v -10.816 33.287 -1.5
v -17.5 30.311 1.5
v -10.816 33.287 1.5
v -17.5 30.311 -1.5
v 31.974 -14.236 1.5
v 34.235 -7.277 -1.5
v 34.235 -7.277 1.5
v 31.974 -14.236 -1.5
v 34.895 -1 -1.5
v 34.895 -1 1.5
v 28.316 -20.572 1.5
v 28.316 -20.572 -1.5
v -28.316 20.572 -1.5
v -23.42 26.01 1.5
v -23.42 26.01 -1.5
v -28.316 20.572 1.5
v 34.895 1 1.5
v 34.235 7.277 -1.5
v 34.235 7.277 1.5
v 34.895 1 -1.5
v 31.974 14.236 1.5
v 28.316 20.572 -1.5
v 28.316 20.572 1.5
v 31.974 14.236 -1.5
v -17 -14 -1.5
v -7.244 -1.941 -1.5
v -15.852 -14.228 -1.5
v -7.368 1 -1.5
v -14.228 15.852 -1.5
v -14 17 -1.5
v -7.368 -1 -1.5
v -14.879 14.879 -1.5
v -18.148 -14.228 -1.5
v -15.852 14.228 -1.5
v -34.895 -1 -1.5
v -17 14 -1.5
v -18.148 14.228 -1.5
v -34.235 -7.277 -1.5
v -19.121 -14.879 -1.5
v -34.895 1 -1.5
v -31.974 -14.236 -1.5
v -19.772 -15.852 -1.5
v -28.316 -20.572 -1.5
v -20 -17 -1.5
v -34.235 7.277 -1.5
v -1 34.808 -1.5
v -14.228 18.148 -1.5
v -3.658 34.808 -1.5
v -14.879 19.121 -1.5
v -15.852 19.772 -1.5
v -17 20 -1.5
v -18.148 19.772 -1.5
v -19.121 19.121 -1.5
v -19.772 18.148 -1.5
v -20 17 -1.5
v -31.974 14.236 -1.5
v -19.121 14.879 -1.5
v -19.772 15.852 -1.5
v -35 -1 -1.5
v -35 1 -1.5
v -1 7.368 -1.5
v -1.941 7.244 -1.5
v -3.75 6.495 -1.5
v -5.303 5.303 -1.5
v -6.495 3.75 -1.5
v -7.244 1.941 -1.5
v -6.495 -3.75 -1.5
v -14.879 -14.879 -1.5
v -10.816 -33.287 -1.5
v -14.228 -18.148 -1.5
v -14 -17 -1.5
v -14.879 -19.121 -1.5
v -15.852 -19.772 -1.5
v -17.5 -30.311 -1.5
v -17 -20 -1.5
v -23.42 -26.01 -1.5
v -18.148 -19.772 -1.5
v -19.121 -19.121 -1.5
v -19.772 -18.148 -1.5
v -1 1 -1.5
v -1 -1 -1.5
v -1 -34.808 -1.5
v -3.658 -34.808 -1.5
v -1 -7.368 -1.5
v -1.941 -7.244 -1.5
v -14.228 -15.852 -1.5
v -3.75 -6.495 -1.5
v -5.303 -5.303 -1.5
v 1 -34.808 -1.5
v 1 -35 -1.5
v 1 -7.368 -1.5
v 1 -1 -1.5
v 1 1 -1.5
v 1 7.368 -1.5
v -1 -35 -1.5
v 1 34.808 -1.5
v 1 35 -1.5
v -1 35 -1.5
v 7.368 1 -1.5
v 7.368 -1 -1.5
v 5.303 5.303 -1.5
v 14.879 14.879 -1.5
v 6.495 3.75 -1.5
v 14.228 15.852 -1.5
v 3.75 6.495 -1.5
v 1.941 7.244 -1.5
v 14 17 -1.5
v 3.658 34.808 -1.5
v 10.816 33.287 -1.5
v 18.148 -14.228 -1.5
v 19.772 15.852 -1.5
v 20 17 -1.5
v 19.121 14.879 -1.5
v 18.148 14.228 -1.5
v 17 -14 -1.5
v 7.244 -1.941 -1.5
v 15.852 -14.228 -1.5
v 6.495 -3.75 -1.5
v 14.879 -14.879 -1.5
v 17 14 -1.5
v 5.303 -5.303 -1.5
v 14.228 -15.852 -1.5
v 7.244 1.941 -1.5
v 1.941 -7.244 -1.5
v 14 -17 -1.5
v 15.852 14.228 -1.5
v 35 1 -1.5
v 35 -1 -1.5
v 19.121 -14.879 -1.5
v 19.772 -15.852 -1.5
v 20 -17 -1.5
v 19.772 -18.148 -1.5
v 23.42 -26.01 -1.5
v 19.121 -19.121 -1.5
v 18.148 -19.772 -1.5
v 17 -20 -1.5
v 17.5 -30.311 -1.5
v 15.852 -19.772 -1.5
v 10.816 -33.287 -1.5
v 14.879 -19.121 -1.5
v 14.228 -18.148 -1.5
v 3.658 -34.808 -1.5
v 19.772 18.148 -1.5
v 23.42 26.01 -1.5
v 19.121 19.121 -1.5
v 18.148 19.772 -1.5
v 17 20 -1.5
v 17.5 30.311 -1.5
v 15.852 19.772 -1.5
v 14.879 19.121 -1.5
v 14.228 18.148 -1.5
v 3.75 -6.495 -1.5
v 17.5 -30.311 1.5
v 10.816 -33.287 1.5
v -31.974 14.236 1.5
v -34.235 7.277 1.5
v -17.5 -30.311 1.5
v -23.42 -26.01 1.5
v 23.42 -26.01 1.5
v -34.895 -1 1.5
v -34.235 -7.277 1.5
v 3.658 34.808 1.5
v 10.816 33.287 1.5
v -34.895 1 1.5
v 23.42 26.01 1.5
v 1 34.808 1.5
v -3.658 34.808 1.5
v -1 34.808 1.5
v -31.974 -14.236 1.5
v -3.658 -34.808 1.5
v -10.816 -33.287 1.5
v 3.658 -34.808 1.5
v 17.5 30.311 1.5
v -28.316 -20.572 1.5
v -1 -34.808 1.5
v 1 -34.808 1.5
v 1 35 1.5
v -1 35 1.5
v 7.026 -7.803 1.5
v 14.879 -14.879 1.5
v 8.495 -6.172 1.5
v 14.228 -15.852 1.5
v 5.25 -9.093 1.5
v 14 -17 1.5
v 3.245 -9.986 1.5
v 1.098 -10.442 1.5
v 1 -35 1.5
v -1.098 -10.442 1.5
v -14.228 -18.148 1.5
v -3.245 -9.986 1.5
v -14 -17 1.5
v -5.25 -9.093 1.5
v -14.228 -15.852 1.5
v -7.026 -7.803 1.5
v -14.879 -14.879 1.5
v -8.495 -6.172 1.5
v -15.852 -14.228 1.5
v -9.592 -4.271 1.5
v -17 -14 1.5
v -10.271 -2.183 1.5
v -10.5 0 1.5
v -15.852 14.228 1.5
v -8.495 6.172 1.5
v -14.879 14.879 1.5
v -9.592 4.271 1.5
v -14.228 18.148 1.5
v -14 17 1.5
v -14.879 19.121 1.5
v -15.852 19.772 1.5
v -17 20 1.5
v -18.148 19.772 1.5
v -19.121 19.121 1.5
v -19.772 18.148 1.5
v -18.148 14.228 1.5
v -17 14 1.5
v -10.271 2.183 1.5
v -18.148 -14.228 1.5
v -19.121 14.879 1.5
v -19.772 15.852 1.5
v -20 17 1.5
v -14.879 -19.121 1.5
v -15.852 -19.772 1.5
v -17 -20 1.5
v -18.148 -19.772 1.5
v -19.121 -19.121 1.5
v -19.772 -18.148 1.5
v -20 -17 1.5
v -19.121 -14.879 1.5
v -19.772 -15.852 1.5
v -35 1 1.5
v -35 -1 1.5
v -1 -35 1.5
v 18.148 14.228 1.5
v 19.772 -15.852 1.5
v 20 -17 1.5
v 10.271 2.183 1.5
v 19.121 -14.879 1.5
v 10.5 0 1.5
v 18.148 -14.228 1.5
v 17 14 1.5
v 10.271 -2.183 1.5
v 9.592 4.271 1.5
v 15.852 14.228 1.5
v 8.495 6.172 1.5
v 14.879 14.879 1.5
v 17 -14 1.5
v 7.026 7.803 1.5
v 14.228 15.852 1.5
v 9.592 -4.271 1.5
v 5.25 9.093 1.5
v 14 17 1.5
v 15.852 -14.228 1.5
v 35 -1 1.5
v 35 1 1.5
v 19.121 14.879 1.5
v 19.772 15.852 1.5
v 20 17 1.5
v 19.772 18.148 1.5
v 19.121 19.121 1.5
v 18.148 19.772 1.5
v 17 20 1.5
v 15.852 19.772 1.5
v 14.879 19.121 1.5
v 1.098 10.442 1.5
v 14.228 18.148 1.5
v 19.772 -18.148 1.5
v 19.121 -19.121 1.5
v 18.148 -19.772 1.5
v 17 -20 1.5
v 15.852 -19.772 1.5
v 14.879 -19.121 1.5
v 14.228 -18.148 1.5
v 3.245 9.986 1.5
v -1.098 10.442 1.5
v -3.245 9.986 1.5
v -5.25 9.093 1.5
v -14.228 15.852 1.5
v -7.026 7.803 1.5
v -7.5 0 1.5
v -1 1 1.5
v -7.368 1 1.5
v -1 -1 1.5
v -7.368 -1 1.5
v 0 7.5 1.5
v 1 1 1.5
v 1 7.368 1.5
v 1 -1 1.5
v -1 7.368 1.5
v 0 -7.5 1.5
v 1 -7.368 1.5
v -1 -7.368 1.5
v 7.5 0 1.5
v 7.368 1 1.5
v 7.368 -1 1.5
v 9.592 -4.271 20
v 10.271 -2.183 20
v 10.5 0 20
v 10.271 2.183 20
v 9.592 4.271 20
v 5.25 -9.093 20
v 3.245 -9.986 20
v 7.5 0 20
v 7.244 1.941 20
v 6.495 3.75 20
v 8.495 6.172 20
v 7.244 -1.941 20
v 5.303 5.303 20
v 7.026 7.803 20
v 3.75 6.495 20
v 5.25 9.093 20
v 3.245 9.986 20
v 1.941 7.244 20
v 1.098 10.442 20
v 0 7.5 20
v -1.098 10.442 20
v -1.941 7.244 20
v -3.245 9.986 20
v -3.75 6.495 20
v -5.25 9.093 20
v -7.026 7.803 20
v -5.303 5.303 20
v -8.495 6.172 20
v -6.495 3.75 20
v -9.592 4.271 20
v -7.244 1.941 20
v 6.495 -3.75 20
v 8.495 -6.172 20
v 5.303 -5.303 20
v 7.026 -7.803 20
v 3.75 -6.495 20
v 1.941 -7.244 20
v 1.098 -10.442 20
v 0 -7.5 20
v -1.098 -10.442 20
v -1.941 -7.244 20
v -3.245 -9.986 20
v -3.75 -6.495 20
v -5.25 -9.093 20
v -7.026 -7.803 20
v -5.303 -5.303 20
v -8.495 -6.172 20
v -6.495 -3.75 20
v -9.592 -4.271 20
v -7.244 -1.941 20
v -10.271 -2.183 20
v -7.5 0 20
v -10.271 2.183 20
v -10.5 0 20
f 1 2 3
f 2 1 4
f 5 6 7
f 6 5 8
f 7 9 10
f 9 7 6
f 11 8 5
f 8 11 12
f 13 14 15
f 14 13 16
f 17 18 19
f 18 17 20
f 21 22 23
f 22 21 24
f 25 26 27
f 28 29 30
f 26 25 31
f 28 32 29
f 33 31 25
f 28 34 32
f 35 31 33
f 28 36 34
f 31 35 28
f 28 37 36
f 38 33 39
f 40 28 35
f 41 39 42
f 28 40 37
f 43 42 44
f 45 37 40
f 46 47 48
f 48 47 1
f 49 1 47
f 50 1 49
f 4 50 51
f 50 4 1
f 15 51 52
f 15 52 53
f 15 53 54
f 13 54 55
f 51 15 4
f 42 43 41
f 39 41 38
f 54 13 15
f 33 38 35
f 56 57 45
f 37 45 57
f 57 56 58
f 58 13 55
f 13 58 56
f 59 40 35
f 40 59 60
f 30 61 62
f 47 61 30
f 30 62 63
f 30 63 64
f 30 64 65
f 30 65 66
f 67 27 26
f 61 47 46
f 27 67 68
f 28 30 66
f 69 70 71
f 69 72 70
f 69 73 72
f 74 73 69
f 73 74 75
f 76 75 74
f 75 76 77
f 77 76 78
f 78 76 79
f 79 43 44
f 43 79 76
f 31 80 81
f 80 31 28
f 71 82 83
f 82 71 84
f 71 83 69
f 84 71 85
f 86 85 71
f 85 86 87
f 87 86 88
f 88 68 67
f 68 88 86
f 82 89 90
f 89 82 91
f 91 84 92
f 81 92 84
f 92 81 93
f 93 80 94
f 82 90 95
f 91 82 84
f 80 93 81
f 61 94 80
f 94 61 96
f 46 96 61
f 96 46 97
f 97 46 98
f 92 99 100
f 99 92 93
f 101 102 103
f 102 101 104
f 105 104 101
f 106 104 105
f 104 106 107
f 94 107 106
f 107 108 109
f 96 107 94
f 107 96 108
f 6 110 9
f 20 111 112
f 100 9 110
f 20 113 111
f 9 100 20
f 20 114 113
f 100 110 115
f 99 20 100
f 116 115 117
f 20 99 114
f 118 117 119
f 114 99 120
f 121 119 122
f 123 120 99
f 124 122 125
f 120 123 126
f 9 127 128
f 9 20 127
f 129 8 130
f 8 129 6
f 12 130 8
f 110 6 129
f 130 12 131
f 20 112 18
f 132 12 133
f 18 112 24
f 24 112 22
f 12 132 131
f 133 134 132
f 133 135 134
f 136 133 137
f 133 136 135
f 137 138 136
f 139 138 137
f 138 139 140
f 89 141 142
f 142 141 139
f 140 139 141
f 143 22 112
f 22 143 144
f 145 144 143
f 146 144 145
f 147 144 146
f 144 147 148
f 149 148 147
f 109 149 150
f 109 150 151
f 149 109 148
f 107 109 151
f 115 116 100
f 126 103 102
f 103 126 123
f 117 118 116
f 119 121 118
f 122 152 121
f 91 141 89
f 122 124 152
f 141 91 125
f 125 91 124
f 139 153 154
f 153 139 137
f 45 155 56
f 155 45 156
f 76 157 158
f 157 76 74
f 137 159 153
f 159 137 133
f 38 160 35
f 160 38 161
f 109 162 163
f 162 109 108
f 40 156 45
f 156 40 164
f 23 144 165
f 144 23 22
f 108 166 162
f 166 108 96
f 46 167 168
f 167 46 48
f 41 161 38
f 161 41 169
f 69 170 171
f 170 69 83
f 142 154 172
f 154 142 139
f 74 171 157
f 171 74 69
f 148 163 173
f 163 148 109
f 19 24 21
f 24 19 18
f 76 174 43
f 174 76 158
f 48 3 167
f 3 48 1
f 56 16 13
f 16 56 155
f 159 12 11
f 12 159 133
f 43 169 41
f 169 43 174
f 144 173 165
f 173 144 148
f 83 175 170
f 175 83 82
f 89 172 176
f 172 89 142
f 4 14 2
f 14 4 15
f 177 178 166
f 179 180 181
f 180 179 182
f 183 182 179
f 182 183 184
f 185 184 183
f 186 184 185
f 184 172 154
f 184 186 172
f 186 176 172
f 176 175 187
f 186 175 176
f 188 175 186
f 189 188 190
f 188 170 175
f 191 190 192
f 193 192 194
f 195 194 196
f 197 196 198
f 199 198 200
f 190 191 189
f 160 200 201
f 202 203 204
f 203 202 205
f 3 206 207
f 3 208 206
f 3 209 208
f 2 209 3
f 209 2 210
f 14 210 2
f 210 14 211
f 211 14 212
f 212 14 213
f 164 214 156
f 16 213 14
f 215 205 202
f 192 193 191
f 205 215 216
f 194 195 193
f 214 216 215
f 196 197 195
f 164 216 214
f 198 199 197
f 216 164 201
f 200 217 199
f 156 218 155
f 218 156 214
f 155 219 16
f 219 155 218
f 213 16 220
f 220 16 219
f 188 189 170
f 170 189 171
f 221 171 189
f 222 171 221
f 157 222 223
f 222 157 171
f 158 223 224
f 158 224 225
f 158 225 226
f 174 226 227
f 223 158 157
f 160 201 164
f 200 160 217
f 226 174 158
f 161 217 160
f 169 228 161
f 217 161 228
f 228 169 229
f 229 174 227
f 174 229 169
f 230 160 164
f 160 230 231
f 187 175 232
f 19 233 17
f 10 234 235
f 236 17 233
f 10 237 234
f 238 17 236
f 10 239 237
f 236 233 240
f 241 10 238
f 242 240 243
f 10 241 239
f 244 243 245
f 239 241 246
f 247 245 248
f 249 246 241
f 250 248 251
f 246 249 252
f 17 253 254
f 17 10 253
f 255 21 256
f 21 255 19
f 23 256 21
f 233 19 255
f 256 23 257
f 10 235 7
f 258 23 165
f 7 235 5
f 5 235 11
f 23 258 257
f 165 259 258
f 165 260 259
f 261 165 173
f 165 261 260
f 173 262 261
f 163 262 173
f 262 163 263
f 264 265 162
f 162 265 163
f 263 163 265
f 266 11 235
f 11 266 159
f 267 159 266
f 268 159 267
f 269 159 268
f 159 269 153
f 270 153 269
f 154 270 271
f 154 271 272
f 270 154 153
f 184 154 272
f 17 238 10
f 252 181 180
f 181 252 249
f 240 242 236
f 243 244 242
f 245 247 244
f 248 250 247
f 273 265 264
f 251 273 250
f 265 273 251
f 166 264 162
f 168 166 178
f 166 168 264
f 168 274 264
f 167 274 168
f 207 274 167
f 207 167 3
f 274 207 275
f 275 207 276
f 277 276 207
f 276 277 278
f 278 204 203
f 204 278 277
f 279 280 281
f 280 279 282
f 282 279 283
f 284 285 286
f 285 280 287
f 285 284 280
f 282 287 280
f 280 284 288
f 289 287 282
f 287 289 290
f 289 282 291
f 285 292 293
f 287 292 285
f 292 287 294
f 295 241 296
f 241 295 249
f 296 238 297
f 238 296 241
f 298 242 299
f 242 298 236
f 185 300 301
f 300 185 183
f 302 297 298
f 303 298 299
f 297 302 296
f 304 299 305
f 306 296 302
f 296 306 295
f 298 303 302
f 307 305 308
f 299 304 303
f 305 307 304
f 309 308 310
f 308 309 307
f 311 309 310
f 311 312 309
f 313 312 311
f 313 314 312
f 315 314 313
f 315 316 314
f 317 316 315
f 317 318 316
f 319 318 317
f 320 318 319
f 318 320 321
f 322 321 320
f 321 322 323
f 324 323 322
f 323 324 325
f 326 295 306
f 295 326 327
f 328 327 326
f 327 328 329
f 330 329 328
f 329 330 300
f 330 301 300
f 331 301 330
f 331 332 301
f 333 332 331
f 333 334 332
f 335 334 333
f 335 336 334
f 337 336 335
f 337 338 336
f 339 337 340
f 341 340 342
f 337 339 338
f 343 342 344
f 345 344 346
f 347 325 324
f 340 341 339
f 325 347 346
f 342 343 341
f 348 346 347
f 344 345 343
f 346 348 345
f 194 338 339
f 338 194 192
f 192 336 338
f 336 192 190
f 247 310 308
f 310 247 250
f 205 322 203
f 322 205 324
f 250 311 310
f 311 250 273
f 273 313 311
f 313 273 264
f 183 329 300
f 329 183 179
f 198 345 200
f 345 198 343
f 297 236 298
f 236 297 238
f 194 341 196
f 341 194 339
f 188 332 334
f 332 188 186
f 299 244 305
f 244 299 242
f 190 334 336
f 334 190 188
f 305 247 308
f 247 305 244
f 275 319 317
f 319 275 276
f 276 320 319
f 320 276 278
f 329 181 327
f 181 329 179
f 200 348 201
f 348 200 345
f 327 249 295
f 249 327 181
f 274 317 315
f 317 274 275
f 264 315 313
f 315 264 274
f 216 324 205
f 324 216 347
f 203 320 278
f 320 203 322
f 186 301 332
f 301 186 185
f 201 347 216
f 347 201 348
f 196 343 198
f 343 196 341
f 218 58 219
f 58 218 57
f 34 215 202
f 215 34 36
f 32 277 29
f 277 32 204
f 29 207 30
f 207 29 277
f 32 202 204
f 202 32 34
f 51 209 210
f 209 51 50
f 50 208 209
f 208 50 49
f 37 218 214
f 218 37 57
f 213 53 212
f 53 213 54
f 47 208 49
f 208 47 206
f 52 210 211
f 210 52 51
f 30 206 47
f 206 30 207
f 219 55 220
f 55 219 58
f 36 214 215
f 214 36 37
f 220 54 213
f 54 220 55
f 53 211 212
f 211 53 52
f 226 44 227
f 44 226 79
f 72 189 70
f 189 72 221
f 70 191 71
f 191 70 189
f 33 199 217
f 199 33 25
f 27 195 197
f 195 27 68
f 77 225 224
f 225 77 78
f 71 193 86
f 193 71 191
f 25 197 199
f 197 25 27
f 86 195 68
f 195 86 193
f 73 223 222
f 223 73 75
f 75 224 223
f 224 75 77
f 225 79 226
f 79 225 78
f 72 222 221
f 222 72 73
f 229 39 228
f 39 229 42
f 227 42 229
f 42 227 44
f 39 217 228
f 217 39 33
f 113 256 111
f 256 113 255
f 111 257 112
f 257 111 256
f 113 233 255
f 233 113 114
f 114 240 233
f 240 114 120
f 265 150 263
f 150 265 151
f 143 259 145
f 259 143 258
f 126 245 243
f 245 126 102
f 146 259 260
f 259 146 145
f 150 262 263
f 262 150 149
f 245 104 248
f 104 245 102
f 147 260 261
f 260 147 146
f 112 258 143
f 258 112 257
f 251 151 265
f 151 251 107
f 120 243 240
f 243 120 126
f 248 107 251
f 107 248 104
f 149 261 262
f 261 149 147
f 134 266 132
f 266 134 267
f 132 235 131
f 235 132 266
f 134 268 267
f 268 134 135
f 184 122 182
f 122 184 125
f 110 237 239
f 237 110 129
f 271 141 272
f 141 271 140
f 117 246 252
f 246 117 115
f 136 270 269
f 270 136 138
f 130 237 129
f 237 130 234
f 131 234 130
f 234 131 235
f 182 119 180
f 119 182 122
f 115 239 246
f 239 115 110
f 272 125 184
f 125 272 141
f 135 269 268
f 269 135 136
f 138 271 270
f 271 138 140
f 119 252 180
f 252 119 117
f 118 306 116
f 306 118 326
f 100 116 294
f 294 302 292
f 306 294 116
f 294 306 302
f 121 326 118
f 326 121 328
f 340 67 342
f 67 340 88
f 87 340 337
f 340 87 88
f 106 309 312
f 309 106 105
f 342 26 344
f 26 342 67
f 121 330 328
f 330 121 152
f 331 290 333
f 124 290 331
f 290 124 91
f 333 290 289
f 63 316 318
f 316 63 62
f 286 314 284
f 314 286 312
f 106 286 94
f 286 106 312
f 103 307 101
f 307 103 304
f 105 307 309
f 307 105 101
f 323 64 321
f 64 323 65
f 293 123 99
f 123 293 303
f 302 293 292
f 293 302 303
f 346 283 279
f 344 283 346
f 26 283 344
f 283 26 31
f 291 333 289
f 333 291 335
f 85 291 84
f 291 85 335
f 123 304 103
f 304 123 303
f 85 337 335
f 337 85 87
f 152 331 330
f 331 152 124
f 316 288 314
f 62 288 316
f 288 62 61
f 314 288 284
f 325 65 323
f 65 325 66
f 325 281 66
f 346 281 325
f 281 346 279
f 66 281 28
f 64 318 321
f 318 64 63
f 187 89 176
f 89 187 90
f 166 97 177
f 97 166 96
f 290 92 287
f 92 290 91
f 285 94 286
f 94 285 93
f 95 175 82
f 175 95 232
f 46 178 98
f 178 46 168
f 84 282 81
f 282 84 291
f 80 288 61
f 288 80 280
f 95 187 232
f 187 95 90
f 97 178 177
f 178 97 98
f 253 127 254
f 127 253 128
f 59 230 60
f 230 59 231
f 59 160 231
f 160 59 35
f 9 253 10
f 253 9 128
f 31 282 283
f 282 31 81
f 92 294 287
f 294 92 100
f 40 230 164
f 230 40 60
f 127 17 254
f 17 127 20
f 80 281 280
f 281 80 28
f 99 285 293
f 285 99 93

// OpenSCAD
BIG_DIA=70;
THICK1=3;
THICK2=20;
SMALL_DIA=15;
//echo(BIG_DIA/4);
HOLES_SPACING=17;
module grate()
{
    for(i=[0]) translate([i,0,0])cube([2,BIG_DIA,THICK1],center=true);
    for(i=[0]) translate([0,i,0])cube([BIG_DIA,2,THICK1],center=true);    
    difference(){
        union(){
    cylinder(r=BIG_DIA/2,h=THICK1,center=true);
    translate([0,0,-THICK2/2])cylinder(r=SMALL_DIA/2+THICK1,h=THICK2,center=true);
            
        }
        union()
        {
    translate([0,0,-THICK2/2])cylinder(r=SMALL_DIA/2,h=THICK2+THICK1+0.1,center=true);
            for(i=[-HOLES_SPACING,HOLES_SPACING])
                for(j=[-HOLES_SPACING,HOLES_SPACING])
                    translate([i,j]) cylinder(r=3,h=THICK2,center=true,$fn=16);
        }
    }
}
rotate([180,0,0]) grate();
